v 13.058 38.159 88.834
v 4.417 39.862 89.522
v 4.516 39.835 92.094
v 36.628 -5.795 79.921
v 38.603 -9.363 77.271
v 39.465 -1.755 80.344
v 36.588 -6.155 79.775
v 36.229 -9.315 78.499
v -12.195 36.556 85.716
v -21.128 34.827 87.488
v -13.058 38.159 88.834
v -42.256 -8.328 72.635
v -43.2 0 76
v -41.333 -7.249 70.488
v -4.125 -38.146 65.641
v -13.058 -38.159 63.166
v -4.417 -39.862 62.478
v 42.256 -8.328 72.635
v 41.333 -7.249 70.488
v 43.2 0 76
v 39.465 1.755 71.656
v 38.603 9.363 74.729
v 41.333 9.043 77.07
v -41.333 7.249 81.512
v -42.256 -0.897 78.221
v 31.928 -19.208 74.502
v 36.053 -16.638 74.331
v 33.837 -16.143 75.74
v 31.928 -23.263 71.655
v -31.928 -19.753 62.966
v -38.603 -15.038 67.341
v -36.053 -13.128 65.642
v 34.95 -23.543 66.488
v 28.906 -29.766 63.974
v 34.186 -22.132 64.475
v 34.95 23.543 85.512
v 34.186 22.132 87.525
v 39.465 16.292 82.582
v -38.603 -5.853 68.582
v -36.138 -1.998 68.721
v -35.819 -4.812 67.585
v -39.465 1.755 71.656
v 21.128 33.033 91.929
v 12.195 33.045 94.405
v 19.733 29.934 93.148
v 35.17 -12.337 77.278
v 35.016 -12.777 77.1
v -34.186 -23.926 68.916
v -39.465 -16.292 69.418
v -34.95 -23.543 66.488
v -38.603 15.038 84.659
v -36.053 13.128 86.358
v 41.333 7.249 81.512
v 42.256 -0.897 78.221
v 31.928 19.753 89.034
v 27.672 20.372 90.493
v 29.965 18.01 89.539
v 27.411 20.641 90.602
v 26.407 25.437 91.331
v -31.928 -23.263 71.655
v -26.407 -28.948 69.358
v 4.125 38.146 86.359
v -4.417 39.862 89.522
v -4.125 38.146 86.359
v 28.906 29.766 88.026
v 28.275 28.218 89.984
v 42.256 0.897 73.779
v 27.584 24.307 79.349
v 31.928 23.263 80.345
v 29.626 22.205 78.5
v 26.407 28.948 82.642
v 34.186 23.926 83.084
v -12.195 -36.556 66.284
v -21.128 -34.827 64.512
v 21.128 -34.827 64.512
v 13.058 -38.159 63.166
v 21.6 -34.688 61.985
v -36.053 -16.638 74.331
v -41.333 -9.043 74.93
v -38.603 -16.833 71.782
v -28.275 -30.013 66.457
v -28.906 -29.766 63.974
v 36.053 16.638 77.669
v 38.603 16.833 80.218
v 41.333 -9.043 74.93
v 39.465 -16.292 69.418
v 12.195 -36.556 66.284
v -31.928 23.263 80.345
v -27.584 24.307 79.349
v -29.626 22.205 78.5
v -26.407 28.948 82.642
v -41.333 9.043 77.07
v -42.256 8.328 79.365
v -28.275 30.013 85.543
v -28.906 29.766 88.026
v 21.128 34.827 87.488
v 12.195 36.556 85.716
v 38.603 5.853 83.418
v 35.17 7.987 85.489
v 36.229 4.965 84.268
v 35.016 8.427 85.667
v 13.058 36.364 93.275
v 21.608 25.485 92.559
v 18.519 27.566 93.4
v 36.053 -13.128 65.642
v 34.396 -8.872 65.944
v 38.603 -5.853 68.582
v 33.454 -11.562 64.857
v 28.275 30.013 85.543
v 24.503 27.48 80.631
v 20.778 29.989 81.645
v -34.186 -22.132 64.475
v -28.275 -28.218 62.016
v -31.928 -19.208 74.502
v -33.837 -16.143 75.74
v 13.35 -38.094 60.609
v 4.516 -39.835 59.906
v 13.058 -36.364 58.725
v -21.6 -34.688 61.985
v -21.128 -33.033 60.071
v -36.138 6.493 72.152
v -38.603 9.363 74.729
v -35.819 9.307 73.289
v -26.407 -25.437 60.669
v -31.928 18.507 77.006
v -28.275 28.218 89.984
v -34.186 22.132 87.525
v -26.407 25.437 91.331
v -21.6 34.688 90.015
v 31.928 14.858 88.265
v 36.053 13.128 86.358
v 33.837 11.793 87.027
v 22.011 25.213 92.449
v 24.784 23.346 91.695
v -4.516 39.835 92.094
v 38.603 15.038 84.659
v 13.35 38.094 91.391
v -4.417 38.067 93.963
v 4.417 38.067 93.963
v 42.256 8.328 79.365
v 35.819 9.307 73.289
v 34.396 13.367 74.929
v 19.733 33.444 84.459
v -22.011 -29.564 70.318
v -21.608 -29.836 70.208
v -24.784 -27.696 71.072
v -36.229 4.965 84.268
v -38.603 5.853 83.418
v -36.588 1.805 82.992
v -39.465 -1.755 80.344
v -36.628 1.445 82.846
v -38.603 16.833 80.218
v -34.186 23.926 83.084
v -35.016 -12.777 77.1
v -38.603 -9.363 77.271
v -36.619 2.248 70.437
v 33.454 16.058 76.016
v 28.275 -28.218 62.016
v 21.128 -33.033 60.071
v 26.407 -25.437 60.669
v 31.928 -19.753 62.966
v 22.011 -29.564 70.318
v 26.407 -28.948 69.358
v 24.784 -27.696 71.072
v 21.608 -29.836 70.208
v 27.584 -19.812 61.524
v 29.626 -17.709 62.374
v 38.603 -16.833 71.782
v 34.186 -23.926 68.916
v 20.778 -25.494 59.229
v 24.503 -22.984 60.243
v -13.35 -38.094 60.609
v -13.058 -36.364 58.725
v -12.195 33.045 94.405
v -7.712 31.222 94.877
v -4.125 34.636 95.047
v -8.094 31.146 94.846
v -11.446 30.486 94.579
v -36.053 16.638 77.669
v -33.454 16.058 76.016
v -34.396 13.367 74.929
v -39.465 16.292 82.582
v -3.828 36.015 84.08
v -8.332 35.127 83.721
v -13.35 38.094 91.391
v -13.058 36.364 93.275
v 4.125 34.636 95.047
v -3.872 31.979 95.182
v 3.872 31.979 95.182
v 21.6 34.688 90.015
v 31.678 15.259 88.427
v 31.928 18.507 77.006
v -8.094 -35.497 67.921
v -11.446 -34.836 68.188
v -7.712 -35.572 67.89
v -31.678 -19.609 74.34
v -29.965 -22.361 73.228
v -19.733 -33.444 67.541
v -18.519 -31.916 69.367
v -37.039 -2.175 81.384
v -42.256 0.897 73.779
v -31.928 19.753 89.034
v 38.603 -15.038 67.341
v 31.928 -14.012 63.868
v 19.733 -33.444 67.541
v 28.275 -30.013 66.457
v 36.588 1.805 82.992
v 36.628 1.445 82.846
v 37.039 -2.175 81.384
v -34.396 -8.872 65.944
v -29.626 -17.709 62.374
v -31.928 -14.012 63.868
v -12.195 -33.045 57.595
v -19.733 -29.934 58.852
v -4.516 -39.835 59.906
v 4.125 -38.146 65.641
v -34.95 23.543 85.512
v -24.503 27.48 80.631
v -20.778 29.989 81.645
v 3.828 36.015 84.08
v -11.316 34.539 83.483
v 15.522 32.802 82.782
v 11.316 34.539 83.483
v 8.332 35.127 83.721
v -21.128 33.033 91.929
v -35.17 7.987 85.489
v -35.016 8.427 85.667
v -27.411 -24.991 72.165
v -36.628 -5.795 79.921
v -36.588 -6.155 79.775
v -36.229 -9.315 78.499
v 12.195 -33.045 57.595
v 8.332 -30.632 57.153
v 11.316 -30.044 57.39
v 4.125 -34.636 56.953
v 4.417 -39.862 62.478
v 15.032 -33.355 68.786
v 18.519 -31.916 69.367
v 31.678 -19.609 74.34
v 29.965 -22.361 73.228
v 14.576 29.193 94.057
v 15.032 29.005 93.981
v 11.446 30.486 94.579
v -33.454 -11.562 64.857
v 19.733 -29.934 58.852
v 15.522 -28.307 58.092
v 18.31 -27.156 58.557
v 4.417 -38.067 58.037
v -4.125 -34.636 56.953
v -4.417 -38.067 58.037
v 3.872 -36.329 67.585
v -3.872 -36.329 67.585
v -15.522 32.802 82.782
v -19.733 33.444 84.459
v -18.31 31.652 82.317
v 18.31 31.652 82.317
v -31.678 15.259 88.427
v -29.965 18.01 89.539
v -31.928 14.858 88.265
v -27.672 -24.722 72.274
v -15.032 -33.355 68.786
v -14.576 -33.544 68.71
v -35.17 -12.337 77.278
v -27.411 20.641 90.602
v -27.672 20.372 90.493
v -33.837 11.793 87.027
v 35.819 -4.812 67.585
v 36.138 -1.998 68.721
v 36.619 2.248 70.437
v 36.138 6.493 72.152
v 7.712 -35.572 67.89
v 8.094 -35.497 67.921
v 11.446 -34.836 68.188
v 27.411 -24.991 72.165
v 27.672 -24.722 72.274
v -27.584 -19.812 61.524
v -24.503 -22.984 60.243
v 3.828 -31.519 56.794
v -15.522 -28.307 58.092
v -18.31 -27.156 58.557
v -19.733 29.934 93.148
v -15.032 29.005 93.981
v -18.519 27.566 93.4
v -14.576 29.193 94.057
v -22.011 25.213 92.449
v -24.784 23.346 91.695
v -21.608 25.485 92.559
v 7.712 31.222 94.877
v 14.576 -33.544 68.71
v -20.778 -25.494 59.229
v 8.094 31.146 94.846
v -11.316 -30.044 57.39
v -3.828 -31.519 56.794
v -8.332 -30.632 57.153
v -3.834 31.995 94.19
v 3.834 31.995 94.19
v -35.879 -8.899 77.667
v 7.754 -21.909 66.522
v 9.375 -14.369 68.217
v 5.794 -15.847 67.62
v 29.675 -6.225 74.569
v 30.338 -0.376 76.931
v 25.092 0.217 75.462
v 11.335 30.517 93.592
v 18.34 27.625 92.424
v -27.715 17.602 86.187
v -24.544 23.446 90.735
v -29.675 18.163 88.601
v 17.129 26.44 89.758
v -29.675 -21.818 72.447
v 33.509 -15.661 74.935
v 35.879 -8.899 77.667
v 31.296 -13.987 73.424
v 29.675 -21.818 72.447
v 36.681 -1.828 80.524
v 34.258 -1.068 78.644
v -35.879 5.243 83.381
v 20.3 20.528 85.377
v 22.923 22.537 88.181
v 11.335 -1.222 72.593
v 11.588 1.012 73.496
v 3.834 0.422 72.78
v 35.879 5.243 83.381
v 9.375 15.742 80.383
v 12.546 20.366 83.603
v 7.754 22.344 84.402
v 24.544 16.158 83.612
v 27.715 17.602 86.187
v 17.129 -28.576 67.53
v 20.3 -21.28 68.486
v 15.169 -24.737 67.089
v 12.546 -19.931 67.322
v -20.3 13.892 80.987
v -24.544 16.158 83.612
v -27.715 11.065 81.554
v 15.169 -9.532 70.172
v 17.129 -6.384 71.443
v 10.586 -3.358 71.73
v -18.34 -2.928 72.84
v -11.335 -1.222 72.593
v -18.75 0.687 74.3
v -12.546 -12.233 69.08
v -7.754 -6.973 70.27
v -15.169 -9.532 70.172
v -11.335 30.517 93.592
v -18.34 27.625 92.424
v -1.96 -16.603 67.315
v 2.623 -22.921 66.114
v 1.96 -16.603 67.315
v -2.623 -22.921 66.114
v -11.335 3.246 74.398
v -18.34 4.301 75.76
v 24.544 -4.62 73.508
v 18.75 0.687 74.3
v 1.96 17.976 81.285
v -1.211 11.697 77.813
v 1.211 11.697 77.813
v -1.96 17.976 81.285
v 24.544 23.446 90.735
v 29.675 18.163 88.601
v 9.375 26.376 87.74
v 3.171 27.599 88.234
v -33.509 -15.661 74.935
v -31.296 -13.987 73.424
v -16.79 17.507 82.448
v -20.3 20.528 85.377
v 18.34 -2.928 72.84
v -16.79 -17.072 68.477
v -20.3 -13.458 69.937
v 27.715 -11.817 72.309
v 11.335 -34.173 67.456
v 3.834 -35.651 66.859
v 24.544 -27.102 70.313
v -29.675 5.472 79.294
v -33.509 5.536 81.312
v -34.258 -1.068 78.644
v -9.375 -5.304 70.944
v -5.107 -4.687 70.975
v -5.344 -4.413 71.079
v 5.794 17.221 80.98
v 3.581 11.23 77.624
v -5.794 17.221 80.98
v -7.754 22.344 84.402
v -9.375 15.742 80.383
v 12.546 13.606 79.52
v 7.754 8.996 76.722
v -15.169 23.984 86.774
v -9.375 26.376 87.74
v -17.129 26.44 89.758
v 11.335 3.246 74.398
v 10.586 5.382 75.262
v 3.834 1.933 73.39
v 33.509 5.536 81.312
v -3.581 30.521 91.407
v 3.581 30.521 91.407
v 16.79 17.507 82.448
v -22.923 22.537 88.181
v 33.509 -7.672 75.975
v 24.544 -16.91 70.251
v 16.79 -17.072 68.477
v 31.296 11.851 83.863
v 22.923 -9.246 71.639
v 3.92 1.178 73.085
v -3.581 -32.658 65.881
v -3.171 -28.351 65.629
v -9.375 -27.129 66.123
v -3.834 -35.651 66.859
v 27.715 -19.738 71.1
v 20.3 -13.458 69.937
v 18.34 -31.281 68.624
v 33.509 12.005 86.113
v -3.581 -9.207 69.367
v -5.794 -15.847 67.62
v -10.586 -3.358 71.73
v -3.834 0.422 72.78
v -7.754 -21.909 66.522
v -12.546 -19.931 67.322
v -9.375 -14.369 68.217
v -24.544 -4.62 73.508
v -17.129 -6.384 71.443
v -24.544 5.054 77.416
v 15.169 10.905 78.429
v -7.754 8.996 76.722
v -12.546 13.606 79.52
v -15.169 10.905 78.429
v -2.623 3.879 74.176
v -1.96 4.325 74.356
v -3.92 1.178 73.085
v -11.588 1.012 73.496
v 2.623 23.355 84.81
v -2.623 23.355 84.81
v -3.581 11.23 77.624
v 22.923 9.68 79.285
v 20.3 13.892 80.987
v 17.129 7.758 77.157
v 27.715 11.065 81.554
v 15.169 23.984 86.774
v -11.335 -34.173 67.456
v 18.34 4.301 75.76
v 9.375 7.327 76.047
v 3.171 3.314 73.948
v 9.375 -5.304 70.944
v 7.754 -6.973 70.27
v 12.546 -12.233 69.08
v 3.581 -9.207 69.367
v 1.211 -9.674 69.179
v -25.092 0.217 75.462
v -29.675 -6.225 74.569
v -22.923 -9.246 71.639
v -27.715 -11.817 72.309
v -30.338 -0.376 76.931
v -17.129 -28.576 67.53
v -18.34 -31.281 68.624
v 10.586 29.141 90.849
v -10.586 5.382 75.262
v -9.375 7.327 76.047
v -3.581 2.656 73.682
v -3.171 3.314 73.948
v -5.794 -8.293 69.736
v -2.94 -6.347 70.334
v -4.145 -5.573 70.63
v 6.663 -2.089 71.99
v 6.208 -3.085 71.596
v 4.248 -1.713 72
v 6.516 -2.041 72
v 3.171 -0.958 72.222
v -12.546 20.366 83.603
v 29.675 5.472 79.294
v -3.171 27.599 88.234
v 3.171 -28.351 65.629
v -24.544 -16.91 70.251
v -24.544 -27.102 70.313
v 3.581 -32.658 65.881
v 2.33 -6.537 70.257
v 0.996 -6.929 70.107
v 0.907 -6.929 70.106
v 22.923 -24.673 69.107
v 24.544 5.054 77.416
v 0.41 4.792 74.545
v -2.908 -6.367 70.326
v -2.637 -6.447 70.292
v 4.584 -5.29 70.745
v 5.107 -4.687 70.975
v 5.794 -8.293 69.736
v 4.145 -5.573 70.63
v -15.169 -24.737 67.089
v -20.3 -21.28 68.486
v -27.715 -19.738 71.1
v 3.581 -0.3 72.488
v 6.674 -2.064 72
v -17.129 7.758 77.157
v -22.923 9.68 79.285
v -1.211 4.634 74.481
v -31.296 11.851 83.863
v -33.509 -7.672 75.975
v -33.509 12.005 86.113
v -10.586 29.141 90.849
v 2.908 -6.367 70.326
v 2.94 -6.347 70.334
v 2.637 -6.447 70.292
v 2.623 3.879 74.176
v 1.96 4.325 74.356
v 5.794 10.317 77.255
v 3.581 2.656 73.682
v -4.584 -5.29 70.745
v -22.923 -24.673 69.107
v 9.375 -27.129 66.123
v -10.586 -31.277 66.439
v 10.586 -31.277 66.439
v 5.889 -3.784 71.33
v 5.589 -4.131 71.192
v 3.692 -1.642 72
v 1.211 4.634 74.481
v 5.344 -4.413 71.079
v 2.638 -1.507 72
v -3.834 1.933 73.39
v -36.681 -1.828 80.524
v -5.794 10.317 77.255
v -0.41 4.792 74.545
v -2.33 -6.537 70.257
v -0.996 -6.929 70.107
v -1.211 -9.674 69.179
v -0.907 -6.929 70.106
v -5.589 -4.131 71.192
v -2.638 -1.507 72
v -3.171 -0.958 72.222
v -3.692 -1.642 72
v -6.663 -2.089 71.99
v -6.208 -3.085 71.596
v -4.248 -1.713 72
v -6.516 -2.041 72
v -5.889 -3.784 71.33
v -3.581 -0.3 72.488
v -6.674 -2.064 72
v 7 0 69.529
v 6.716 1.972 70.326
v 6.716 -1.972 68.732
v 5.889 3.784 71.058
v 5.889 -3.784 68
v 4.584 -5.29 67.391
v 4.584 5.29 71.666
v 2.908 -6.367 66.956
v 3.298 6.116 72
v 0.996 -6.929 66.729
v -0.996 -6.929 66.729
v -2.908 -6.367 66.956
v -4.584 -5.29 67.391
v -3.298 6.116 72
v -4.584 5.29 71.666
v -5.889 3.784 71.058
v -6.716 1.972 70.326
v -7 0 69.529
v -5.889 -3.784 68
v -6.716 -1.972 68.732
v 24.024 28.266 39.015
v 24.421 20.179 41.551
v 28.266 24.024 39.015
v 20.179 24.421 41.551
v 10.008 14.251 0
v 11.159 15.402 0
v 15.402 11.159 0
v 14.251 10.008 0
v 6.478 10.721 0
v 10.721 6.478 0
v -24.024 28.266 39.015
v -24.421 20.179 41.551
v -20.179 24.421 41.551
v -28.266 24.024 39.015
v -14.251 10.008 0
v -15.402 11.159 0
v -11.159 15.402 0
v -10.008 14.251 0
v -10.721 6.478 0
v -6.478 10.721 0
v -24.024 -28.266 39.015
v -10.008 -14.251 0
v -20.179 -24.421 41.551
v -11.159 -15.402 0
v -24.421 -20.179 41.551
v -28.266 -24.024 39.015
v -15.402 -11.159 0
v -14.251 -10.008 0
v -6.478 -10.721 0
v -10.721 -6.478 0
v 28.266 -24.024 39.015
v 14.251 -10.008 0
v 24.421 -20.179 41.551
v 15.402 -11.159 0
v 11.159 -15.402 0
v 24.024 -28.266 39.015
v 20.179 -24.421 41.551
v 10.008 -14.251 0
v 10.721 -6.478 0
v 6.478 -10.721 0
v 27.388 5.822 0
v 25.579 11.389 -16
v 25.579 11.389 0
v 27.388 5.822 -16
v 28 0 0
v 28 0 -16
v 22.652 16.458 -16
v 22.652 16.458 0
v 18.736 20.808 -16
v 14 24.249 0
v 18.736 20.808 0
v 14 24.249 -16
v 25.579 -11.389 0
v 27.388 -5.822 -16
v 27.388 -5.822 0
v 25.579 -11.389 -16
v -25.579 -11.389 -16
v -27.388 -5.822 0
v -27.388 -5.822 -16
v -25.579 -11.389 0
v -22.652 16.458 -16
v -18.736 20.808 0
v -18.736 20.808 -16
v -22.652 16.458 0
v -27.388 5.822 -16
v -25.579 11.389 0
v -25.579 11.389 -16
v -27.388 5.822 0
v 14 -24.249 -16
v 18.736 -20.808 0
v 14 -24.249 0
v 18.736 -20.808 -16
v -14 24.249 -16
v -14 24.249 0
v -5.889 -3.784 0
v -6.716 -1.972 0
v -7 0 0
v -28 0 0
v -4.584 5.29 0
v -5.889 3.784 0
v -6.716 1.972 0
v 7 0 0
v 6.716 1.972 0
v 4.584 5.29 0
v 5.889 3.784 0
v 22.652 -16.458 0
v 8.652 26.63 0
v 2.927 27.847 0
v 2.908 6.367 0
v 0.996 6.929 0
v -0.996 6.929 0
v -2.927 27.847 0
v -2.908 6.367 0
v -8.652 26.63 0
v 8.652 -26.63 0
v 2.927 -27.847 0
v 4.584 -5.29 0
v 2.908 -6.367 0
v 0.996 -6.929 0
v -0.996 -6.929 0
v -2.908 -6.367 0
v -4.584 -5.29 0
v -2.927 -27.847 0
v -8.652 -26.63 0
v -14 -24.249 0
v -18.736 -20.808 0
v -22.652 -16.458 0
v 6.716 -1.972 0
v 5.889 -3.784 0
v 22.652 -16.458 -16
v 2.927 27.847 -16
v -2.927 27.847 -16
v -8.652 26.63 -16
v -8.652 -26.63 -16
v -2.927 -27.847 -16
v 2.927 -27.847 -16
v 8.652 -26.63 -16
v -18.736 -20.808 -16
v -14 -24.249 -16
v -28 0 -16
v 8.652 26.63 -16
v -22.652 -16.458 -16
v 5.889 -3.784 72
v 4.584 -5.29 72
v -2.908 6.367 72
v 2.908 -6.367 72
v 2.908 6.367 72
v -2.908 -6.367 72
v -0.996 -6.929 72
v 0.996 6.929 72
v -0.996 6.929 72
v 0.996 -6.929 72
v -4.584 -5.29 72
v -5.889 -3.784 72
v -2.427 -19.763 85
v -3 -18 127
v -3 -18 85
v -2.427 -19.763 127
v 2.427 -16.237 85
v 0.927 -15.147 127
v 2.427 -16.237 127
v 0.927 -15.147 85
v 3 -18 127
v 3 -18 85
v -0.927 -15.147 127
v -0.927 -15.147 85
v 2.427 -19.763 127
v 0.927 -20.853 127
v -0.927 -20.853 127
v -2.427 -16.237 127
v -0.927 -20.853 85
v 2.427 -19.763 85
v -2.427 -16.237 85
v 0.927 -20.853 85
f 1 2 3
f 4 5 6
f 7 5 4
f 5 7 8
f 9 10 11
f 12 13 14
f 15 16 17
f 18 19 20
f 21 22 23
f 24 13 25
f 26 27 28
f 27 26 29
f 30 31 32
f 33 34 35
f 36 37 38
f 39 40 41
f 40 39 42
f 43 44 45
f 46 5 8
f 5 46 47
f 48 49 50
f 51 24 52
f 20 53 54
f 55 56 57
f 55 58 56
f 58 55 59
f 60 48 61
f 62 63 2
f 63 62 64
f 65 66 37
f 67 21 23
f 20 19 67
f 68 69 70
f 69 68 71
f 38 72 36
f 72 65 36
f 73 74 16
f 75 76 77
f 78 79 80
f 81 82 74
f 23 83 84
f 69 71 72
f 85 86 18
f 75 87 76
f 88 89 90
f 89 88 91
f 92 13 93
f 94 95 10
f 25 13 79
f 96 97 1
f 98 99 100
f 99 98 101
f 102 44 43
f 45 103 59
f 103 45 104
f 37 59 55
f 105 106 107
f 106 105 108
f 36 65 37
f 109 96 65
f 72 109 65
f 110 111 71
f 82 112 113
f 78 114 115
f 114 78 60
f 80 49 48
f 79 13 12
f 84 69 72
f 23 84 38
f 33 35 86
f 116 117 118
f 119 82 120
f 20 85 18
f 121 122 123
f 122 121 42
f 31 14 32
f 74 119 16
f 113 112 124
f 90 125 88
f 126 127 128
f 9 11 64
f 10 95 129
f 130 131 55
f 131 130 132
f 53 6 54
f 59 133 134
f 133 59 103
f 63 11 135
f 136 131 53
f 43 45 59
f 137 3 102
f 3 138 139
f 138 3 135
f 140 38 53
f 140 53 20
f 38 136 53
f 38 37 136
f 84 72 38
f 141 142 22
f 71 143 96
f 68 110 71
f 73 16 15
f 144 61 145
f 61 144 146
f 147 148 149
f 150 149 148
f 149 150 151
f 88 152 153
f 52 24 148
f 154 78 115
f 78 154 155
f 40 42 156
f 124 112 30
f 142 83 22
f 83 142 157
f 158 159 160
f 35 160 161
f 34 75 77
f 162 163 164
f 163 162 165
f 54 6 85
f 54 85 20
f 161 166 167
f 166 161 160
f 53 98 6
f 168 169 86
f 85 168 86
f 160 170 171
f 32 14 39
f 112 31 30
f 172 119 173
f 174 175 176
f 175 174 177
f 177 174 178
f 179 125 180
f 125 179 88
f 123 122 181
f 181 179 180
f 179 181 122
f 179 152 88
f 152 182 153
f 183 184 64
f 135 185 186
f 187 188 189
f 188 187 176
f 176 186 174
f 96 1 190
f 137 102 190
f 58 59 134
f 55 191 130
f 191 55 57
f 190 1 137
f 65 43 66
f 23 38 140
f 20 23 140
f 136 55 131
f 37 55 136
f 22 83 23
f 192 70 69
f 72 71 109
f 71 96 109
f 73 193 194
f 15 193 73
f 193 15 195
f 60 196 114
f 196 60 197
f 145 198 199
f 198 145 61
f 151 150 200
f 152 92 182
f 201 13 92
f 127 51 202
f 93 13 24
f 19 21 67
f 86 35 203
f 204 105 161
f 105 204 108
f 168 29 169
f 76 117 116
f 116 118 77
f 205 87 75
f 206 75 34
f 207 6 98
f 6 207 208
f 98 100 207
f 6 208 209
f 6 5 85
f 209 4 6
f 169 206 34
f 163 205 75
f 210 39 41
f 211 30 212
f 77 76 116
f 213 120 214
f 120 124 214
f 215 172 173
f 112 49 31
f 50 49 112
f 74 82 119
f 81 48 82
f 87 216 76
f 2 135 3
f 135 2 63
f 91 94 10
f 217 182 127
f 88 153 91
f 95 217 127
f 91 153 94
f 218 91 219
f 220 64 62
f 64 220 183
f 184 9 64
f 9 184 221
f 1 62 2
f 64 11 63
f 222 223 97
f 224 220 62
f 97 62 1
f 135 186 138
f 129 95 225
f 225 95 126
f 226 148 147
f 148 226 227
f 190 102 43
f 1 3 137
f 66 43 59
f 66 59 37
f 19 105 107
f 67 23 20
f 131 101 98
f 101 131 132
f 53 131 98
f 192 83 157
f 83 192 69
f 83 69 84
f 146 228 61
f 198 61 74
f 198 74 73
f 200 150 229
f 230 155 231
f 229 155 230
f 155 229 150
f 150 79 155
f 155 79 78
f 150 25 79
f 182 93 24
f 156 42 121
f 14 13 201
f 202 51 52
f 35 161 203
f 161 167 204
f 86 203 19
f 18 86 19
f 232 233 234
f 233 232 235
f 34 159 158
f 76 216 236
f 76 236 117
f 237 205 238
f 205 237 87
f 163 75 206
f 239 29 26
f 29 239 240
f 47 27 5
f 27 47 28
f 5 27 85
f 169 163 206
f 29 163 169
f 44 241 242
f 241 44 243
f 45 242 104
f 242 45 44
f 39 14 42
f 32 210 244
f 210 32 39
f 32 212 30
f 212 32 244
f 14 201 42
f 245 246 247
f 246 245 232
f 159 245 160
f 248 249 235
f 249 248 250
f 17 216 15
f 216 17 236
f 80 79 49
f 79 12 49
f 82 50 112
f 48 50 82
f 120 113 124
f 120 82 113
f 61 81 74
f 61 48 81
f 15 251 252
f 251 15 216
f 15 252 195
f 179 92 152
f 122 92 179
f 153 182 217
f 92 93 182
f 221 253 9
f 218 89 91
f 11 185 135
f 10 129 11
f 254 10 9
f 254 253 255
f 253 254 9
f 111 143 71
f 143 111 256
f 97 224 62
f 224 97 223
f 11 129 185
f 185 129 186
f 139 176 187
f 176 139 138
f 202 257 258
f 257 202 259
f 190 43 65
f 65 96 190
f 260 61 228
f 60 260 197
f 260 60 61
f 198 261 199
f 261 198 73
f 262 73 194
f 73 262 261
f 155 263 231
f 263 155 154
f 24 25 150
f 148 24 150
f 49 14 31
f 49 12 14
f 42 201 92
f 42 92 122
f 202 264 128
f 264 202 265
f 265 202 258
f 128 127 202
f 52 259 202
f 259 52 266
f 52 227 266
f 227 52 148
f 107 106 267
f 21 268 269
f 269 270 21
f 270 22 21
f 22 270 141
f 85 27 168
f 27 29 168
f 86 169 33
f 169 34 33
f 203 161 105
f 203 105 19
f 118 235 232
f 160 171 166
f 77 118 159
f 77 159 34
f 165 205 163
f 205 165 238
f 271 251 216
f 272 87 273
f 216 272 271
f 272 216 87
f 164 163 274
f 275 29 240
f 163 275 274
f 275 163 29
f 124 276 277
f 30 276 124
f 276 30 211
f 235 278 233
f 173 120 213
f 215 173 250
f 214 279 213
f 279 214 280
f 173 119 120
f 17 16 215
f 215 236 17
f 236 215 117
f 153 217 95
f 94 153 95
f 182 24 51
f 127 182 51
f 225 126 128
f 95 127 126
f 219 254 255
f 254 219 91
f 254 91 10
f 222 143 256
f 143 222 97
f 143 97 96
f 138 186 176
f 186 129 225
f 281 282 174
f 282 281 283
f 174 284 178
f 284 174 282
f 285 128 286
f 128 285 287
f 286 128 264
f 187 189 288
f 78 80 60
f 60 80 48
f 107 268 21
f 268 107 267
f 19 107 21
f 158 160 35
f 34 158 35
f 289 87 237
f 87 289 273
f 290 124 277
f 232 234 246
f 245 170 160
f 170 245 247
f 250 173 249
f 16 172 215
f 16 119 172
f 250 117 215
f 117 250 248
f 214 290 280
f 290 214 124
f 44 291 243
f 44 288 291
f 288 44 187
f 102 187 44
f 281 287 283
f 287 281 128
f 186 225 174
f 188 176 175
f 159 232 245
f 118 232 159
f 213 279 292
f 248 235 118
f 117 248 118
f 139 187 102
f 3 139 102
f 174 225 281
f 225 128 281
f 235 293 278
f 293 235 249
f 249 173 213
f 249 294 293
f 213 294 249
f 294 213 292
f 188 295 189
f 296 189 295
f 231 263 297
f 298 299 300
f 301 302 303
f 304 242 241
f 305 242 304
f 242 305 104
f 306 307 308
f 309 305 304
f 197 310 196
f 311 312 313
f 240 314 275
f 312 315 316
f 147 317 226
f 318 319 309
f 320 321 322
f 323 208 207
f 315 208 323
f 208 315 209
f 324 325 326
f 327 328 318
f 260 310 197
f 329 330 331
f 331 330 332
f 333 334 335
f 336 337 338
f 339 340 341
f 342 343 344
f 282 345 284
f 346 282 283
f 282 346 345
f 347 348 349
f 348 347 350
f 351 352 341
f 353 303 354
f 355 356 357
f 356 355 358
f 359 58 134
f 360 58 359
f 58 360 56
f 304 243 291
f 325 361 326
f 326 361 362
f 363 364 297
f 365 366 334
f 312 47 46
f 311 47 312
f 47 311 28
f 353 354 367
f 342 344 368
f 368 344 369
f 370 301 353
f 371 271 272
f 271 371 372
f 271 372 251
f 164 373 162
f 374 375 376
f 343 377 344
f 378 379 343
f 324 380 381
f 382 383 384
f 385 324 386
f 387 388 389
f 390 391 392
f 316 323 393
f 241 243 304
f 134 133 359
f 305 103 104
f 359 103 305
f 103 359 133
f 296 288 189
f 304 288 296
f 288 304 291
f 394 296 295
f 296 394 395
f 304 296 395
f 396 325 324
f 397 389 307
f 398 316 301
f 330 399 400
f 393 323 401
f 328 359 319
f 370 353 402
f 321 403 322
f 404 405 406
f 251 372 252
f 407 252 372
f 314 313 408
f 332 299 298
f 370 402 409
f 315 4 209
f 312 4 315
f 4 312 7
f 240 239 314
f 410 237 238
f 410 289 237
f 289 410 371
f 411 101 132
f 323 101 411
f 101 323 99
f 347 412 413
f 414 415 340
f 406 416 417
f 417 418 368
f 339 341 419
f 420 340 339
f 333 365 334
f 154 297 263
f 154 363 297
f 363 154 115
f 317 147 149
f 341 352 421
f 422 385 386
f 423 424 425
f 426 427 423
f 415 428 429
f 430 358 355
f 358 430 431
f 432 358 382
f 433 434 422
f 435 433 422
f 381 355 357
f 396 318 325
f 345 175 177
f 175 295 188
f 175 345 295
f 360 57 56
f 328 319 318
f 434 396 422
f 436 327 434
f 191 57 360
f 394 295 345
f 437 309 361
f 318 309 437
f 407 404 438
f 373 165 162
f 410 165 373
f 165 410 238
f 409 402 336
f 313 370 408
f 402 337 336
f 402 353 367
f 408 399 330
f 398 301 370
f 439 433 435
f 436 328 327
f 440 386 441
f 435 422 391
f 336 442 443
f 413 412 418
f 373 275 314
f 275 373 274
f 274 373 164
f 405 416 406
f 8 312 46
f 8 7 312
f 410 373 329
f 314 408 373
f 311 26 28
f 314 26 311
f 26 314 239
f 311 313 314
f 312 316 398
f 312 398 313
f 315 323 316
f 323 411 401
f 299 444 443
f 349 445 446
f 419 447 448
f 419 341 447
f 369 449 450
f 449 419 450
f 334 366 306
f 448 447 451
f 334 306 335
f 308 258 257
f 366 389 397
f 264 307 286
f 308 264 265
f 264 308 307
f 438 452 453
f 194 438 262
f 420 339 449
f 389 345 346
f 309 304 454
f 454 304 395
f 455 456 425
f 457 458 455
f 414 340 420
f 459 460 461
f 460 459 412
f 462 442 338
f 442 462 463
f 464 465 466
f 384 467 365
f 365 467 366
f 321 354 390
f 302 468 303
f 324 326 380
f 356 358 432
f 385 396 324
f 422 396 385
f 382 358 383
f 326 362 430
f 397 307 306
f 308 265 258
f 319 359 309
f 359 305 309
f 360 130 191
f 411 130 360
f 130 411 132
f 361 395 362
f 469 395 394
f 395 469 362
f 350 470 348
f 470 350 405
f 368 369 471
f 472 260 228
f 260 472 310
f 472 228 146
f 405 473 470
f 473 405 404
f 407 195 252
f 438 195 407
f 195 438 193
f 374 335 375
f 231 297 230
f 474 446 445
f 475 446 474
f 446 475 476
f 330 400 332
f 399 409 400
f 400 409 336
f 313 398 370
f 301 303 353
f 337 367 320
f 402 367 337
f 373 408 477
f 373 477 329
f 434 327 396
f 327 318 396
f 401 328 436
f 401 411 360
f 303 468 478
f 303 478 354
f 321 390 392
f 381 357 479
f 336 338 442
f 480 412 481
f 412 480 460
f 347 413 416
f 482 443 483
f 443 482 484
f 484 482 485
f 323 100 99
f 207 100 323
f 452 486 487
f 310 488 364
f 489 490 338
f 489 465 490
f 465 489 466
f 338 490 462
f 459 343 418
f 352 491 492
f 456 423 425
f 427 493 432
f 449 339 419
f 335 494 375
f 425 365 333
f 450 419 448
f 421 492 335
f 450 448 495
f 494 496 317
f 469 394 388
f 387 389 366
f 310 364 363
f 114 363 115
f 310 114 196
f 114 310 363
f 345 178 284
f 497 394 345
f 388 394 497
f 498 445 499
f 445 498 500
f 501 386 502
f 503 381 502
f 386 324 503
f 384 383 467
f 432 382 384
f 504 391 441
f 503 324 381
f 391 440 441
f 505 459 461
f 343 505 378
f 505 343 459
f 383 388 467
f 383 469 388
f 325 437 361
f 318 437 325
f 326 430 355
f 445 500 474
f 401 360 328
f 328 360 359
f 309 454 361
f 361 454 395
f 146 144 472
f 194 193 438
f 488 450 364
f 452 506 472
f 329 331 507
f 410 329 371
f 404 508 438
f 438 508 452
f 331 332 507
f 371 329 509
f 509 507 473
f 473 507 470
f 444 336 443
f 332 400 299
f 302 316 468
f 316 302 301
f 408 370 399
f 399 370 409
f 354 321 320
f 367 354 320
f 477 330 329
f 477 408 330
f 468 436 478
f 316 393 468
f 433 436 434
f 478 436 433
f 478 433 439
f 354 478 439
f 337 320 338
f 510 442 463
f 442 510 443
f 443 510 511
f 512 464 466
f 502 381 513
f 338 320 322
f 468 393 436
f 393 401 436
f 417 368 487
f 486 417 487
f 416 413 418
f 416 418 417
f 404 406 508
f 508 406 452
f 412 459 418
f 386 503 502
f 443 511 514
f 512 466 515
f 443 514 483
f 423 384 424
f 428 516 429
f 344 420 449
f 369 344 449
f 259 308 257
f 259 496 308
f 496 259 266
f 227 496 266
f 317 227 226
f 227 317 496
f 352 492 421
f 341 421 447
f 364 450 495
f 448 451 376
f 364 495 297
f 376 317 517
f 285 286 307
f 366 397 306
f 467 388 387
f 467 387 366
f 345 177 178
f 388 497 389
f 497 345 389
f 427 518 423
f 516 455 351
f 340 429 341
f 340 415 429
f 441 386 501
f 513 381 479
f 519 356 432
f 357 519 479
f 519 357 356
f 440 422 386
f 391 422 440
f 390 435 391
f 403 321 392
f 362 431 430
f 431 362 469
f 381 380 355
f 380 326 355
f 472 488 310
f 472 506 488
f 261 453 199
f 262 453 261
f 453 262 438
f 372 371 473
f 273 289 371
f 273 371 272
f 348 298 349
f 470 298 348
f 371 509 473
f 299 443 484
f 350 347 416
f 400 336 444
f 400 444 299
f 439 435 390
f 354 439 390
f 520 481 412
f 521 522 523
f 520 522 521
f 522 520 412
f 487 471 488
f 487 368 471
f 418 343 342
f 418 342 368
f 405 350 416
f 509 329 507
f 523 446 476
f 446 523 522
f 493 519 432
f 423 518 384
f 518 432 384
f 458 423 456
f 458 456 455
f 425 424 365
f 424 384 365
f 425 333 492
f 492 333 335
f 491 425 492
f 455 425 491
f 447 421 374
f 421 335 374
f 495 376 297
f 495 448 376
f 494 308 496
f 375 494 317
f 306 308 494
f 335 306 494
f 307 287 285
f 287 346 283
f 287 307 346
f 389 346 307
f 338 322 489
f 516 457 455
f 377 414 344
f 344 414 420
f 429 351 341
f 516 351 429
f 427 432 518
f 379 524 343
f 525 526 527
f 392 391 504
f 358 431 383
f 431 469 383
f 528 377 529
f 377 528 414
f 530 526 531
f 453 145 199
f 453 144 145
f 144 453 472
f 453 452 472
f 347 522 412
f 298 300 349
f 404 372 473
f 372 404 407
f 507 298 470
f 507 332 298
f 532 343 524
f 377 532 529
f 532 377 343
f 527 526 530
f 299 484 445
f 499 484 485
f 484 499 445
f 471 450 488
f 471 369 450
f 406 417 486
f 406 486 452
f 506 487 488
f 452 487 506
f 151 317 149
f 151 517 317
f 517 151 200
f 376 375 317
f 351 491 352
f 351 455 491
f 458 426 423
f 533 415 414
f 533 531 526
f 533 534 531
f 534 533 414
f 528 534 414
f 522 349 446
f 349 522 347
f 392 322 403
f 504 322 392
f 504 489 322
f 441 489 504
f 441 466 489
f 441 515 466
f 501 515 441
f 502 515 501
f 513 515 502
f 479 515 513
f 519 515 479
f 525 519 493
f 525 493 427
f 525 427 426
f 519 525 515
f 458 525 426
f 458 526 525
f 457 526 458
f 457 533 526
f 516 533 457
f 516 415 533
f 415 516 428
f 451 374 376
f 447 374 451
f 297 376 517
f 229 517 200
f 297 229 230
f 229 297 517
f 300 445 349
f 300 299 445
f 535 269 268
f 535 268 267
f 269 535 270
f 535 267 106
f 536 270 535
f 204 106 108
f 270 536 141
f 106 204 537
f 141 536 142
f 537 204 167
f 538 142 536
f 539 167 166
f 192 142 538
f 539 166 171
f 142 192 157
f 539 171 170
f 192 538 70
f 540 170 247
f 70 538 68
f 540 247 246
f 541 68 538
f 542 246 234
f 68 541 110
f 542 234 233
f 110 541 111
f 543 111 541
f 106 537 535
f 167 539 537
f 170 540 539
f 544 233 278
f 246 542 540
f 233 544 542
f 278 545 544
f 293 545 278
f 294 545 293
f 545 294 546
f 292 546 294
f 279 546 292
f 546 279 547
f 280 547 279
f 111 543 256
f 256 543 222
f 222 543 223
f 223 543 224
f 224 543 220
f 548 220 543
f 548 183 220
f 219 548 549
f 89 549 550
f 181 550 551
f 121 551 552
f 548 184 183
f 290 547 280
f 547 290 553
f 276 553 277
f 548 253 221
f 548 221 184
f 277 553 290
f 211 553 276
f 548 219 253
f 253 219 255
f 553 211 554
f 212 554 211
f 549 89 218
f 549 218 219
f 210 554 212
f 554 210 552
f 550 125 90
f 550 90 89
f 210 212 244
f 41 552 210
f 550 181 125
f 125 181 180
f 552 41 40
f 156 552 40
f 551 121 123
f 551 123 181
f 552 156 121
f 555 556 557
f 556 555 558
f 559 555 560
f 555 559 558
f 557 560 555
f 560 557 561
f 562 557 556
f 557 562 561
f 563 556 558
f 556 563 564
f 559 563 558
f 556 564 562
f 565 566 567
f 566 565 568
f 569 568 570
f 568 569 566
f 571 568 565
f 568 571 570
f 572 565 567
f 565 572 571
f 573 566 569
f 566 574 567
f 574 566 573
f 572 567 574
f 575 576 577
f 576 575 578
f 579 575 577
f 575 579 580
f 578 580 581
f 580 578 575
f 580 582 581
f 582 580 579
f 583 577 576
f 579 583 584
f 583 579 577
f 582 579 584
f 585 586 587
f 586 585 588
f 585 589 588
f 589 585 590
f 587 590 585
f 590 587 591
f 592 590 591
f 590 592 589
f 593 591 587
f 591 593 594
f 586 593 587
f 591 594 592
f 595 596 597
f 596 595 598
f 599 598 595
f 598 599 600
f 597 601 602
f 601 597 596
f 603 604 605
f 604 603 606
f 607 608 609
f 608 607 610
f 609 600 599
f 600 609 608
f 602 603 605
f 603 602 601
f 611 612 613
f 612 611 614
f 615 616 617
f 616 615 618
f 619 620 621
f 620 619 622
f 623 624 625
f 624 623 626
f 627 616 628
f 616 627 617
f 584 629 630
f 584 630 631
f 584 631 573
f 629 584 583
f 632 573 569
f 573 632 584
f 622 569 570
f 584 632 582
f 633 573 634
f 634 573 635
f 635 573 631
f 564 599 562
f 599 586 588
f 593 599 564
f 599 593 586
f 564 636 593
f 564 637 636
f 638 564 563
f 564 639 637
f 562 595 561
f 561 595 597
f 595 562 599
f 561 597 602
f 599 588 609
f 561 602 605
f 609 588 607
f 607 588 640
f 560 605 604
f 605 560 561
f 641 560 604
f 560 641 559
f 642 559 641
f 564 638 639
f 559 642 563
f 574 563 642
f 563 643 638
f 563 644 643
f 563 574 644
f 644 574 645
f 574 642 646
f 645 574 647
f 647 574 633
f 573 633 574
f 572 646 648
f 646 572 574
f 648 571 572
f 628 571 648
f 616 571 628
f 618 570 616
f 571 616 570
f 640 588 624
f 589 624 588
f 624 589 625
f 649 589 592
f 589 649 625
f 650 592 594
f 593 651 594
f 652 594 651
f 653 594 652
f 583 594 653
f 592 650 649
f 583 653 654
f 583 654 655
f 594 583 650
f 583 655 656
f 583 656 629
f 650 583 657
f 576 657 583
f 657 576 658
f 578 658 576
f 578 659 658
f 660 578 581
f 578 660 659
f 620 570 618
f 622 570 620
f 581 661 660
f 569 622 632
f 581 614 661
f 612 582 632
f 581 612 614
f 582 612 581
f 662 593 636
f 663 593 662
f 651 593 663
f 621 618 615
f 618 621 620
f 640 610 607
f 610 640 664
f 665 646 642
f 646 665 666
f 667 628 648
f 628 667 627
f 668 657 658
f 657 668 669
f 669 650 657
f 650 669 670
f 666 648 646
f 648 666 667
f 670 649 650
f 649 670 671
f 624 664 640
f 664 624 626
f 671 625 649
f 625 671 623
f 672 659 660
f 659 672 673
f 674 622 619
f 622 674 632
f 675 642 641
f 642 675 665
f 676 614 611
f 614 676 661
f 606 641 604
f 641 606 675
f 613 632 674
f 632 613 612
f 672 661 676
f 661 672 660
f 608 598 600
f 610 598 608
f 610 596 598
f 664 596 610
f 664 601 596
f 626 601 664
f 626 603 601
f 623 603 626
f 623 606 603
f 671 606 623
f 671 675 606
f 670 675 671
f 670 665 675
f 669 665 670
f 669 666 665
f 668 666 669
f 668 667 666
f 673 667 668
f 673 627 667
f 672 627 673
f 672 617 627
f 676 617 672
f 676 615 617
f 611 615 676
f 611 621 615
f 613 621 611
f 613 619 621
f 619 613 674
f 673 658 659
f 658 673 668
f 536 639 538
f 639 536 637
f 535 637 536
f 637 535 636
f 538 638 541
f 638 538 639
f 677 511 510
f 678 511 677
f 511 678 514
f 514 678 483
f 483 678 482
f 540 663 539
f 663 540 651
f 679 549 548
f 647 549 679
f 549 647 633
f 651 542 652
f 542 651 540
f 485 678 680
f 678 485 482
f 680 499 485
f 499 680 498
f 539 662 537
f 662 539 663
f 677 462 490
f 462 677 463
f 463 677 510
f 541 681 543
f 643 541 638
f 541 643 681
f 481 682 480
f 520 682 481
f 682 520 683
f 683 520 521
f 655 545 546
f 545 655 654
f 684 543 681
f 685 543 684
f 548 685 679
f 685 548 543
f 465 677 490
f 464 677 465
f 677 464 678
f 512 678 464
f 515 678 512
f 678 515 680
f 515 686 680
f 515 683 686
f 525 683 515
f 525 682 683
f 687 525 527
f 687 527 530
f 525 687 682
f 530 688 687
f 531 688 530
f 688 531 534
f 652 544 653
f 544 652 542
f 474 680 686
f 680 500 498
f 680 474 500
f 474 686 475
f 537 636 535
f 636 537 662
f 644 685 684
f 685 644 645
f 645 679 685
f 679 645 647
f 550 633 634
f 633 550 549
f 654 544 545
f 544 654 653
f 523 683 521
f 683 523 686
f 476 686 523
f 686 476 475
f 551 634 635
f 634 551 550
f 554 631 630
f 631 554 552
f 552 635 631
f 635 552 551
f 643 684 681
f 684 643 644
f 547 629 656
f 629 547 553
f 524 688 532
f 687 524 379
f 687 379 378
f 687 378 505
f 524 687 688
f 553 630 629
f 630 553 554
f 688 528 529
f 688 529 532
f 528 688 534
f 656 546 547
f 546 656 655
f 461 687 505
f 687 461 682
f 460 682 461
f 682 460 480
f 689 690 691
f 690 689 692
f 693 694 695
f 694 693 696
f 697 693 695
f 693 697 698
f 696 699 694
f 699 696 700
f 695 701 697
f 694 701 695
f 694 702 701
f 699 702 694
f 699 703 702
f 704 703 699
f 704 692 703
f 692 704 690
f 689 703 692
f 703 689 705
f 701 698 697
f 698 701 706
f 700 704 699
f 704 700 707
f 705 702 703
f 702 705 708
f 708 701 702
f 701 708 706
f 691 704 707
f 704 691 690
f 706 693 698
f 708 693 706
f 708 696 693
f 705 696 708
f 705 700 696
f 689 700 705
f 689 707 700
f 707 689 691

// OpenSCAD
// 3DScad sample: observatory dish
// Uses only the currently round-trippable subset.

module scene_model() {
    mast_height = 72;

    union() {
        translate([0, 0, -8]) {
            cylinder(h=16, r=28, center=true);
        }

        translate([0, 0, mast_height/2]) {
            cylinder(h=mast_height, r=7, center=true);
        }

        translate([0, 0, mast_height + 4]) {
            rotate([22, 0, 0]) {
                difference() {
                    scale([1.35, 1.35, 0.36]) {
                        sphere(r=32);
                    }
                    translate([0, 0, 7]) {
                        scale([1.25, 1.25, 0.34]) {
                            sphere(r=30);
                        }
                    }
                    translate([0, 0, -25]) {
                        cube([90, 90, 38], center=true);
                    }
                }
            }
        }

        translate([0, -18, mast_height + 34]) {
            cylinder(h=42, r=3, center=true);
        }

        for (leg = [0 : 1 : 3]) {
            rotate([0, 0, leg*90 + 45]) {
                translate([22, 0, 14]) {
                    rotate([0, 25, 0]) {
                        cube([6, 6, 58], center=true);
                    }
                }
            }
        }
    }
}

scene_model();
